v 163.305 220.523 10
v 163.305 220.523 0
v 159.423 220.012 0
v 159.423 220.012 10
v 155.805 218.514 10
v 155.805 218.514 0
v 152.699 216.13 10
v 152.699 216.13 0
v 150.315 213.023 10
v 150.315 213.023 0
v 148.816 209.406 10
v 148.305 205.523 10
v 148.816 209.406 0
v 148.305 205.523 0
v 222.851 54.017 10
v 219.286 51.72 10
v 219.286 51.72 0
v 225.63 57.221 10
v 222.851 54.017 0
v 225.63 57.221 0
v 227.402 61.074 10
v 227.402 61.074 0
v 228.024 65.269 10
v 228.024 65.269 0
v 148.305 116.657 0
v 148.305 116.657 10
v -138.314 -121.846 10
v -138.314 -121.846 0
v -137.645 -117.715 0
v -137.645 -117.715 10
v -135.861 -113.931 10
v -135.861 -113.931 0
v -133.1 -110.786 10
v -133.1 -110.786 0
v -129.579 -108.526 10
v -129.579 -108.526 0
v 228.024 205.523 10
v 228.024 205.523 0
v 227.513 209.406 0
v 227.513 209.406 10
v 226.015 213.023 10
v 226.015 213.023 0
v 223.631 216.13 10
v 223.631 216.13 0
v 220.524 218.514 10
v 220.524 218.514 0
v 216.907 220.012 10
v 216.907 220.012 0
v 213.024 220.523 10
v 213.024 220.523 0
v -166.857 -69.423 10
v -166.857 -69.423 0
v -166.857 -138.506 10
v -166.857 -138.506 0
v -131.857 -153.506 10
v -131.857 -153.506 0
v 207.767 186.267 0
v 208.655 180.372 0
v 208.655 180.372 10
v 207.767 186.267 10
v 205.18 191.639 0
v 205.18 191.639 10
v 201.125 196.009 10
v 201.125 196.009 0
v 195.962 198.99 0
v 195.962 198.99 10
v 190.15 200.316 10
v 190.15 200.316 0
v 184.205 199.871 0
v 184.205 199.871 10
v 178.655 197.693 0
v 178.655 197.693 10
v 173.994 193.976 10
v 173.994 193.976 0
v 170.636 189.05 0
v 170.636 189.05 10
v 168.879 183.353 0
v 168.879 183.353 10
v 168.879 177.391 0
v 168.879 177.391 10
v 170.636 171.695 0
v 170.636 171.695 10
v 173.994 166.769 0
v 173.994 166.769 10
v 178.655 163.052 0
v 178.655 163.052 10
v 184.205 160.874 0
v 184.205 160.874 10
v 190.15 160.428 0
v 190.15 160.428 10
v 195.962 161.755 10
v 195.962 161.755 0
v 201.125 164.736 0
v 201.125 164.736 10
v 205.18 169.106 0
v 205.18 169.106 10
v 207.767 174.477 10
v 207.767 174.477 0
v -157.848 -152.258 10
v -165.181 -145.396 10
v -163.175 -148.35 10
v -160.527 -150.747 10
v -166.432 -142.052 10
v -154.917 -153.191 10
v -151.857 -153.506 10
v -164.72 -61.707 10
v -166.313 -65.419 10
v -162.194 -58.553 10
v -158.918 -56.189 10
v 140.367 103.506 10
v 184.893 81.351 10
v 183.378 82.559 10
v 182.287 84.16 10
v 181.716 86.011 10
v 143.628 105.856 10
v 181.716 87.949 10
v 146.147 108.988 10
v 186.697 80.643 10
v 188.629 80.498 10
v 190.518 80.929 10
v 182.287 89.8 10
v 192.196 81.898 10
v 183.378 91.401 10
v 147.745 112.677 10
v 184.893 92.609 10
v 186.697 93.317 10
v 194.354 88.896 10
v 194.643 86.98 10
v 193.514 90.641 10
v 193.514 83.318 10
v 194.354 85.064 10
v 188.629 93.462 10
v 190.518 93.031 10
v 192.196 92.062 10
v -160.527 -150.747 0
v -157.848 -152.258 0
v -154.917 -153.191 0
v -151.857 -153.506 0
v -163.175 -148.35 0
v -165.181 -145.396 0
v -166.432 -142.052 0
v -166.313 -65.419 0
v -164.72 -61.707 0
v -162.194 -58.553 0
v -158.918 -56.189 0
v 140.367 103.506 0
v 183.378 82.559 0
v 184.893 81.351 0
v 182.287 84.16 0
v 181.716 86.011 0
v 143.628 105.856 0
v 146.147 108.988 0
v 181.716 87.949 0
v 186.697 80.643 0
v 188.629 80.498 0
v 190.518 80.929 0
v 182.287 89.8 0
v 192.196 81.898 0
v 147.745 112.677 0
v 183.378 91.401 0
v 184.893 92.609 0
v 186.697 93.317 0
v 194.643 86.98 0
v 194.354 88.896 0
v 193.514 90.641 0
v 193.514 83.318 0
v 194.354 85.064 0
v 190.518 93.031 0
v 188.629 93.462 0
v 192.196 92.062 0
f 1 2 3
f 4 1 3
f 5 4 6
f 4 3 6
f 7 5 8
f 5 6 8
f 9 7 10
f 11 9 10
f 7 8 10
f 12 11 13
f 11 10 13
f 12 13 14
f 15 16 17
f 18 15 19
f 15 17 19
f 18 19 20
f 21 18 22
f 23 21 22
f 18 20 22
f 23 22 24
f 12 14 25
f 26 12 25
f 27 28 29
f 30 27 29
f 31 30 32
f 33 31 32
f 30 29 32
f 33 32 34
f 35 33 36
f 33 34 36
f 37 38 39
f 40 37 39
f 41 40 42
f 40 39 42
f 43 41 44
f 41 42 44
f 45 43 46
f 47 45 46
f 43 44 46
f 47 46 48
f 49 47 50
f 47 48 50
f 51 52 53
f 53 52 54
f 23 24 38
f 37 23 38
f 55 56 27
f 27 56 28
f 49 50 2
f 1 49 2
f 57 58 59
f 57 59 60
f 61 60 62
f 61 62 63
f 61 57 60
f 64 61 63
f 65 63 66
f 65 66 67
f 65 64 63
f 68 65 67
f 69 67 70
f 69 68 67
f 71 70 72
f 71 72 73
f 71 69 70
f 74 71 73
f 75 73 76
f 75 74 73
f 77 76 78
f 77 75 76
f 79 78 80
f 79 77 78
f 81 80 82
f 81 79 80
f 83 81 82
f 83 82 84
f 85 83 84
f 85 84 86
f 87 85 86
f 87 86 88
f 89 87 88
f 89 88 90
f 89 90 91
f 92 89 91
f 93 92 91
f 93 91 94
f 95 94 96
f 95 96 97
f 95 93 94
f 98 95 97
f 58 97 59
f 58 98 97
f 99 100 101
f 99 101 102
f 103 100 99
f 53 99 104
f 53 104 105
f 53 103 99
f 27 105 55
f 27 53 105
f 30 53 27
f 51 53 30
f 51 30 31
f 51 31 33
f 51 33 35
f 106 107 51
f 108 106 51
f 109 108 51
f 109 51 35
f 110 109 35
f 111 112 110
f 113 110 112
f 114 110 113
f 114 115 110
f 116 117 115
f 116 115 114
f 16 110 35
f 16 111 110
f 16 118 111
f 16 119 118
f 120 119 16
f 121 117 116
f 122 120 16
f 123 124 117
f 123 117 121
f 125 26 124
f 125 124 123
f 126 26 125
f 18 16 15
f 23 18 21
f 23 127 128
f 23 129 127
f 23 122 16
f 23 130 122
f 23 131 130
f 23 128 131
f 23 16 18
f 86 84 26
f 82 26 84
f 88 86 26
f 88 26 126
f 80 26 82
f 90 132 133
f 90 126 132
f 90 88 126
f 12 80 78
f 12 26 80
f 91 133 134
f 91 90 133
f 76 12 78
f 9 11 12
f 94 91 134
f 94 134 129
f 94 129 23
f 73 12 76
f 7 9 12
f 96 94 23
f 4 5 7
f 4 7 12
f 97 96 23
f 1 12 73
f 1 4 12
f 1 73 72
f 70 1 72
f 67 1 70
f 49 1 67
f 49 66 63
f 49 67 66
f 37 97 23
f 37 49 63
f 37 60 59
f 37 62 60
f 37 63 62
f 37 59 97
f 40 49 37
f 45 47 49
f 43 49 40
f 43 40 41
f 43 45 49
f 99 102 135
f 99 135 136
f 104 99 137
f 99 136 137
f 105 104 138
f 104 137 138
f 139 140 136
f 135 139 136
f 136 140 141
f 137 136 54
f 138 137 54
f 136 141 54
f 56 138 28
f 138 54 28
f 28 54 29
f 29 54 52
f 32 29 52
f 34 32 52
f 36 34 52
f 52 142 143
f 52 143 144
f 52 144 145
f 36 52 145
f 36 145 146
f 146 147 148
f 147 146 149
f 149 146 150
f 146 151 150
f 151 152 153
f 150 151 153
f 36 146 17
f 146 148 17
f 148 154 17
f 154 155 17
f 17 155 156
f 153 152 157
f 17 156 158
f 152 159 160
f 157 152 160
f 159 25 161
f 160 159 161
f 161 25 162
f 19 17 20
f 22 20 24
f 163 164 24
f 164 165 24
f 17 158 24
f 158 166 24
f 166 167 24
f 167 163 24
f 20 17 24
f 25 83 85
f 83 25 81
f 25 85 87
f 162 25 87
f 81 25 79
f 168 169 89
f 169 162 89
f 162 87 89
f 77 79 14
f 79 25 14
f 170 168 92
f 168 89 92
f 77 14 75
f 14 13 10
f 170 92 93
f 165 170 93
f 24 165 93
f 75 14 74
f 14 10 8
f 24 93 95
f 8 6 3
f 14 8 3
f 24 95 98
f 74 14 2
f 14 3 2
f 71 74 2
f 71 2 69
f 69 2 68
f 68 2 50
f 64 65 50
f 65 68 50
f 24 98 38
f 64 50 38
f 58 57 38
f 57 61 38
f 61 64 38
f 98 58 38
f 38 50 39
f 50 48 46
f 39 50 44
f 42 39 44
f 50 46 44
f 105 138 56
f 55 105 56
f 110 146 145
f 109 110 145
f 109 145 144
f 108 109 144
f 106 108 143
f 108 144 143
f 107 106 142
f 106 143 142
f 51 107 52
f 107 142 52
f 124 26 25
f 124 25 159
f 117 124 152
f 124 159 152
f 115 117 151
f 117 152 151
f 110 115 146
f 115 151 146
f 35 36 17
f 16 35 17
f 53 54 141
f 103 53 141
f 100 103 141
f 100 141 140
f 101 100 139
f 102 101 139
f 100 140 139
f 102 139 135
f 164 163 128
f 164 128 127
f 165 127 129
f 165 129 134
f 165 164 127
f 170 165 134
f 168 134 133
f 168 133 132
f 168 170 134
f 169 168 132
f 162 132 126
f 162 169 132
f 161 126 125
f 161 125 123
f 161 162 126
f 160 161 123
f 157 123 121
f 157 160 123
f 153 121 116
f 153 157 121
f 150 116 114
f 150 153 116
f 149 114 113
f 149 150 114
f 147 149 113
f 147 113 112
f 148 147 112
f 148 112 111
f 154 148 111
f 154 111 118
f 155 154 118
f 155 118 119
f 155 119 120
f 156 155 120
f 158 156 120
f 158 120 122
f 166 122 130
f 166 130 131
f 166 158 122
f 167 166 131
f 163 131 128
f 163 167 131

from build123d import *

# Parameters (mm, degrees)
F0_R     = 6.5
F0_R_2   = 20
F1_DEPTH = 10


with BuildPart() as f1:
    # F0 (on Top) → F1 (new body)
    with BuildSketch(Plane.XY):
        with BuildLine():
            Line((140.366762, 103.505751), (-158.918484, -56.188821))
            ThreePointArc((-158.918484, -56.188821), (-164.720206, -61.706555), (-166.857052, -69.422724))
            Line((-166.857052, -69.422724), (-166.857052, -138.506076))
            ThreePointArc((-166.857052, -138.506076), (-165.180916, -145.396261), (-160.527098, -150.746595))
            ThreePointArc((-160.527098, -150.746595), (-156.40635, -152.799567), (-151.857052, -153.506076))
            Line((-151.857052, -153.506076), (-142.060088, -153.506076))
            Line((-142.060088, -153.506076), (-131.857052, -153.506076))
            Line((-131.857052, -153.506076), (-138.314184, -121.846012))
            ThreePointArc((-138.314184, -121.846012), (-135.860571, -113.930547), (-129.578516, -108.525866))
            Line((-129.578516, -108.525866), (219.285821, 51.720148))
            ThreePointArc((219.285821, 51.720148), (225.630142, 57.220563), (228.024481, 65.268676))
            Line((228.024481, 65.268676), (228.024481, 205.523393))
            ThreePointArc((228.024481, 205.523393), (223.631082, 216.129995), (213.024481, 220.523393))
            Line((213.024481, 220.523393), (163.305104, 220.523393))
            ThreePointArc((163.305104, 220.523393), (152.698503, 216.129995), (148.305104, 205.523393))
            Line((148.305104, 205.523393), (148.305104, 116.657392))
            ThreePointArc((148.305104, 116.657392), (146.147278, 108.988242), (140.366762, 103.505751))
        make_face()
        with Locations((188.142948, 86.979855)):
            Circle(F0_R, mode=Mode.SUBTRACT)
        with Locations((188.655132, 180.372253)):
            Circle(F0_R_2, mode=Mode.SUBTRACT)
    extrude(amount=F1_DEPTH)


solid = f1.part
